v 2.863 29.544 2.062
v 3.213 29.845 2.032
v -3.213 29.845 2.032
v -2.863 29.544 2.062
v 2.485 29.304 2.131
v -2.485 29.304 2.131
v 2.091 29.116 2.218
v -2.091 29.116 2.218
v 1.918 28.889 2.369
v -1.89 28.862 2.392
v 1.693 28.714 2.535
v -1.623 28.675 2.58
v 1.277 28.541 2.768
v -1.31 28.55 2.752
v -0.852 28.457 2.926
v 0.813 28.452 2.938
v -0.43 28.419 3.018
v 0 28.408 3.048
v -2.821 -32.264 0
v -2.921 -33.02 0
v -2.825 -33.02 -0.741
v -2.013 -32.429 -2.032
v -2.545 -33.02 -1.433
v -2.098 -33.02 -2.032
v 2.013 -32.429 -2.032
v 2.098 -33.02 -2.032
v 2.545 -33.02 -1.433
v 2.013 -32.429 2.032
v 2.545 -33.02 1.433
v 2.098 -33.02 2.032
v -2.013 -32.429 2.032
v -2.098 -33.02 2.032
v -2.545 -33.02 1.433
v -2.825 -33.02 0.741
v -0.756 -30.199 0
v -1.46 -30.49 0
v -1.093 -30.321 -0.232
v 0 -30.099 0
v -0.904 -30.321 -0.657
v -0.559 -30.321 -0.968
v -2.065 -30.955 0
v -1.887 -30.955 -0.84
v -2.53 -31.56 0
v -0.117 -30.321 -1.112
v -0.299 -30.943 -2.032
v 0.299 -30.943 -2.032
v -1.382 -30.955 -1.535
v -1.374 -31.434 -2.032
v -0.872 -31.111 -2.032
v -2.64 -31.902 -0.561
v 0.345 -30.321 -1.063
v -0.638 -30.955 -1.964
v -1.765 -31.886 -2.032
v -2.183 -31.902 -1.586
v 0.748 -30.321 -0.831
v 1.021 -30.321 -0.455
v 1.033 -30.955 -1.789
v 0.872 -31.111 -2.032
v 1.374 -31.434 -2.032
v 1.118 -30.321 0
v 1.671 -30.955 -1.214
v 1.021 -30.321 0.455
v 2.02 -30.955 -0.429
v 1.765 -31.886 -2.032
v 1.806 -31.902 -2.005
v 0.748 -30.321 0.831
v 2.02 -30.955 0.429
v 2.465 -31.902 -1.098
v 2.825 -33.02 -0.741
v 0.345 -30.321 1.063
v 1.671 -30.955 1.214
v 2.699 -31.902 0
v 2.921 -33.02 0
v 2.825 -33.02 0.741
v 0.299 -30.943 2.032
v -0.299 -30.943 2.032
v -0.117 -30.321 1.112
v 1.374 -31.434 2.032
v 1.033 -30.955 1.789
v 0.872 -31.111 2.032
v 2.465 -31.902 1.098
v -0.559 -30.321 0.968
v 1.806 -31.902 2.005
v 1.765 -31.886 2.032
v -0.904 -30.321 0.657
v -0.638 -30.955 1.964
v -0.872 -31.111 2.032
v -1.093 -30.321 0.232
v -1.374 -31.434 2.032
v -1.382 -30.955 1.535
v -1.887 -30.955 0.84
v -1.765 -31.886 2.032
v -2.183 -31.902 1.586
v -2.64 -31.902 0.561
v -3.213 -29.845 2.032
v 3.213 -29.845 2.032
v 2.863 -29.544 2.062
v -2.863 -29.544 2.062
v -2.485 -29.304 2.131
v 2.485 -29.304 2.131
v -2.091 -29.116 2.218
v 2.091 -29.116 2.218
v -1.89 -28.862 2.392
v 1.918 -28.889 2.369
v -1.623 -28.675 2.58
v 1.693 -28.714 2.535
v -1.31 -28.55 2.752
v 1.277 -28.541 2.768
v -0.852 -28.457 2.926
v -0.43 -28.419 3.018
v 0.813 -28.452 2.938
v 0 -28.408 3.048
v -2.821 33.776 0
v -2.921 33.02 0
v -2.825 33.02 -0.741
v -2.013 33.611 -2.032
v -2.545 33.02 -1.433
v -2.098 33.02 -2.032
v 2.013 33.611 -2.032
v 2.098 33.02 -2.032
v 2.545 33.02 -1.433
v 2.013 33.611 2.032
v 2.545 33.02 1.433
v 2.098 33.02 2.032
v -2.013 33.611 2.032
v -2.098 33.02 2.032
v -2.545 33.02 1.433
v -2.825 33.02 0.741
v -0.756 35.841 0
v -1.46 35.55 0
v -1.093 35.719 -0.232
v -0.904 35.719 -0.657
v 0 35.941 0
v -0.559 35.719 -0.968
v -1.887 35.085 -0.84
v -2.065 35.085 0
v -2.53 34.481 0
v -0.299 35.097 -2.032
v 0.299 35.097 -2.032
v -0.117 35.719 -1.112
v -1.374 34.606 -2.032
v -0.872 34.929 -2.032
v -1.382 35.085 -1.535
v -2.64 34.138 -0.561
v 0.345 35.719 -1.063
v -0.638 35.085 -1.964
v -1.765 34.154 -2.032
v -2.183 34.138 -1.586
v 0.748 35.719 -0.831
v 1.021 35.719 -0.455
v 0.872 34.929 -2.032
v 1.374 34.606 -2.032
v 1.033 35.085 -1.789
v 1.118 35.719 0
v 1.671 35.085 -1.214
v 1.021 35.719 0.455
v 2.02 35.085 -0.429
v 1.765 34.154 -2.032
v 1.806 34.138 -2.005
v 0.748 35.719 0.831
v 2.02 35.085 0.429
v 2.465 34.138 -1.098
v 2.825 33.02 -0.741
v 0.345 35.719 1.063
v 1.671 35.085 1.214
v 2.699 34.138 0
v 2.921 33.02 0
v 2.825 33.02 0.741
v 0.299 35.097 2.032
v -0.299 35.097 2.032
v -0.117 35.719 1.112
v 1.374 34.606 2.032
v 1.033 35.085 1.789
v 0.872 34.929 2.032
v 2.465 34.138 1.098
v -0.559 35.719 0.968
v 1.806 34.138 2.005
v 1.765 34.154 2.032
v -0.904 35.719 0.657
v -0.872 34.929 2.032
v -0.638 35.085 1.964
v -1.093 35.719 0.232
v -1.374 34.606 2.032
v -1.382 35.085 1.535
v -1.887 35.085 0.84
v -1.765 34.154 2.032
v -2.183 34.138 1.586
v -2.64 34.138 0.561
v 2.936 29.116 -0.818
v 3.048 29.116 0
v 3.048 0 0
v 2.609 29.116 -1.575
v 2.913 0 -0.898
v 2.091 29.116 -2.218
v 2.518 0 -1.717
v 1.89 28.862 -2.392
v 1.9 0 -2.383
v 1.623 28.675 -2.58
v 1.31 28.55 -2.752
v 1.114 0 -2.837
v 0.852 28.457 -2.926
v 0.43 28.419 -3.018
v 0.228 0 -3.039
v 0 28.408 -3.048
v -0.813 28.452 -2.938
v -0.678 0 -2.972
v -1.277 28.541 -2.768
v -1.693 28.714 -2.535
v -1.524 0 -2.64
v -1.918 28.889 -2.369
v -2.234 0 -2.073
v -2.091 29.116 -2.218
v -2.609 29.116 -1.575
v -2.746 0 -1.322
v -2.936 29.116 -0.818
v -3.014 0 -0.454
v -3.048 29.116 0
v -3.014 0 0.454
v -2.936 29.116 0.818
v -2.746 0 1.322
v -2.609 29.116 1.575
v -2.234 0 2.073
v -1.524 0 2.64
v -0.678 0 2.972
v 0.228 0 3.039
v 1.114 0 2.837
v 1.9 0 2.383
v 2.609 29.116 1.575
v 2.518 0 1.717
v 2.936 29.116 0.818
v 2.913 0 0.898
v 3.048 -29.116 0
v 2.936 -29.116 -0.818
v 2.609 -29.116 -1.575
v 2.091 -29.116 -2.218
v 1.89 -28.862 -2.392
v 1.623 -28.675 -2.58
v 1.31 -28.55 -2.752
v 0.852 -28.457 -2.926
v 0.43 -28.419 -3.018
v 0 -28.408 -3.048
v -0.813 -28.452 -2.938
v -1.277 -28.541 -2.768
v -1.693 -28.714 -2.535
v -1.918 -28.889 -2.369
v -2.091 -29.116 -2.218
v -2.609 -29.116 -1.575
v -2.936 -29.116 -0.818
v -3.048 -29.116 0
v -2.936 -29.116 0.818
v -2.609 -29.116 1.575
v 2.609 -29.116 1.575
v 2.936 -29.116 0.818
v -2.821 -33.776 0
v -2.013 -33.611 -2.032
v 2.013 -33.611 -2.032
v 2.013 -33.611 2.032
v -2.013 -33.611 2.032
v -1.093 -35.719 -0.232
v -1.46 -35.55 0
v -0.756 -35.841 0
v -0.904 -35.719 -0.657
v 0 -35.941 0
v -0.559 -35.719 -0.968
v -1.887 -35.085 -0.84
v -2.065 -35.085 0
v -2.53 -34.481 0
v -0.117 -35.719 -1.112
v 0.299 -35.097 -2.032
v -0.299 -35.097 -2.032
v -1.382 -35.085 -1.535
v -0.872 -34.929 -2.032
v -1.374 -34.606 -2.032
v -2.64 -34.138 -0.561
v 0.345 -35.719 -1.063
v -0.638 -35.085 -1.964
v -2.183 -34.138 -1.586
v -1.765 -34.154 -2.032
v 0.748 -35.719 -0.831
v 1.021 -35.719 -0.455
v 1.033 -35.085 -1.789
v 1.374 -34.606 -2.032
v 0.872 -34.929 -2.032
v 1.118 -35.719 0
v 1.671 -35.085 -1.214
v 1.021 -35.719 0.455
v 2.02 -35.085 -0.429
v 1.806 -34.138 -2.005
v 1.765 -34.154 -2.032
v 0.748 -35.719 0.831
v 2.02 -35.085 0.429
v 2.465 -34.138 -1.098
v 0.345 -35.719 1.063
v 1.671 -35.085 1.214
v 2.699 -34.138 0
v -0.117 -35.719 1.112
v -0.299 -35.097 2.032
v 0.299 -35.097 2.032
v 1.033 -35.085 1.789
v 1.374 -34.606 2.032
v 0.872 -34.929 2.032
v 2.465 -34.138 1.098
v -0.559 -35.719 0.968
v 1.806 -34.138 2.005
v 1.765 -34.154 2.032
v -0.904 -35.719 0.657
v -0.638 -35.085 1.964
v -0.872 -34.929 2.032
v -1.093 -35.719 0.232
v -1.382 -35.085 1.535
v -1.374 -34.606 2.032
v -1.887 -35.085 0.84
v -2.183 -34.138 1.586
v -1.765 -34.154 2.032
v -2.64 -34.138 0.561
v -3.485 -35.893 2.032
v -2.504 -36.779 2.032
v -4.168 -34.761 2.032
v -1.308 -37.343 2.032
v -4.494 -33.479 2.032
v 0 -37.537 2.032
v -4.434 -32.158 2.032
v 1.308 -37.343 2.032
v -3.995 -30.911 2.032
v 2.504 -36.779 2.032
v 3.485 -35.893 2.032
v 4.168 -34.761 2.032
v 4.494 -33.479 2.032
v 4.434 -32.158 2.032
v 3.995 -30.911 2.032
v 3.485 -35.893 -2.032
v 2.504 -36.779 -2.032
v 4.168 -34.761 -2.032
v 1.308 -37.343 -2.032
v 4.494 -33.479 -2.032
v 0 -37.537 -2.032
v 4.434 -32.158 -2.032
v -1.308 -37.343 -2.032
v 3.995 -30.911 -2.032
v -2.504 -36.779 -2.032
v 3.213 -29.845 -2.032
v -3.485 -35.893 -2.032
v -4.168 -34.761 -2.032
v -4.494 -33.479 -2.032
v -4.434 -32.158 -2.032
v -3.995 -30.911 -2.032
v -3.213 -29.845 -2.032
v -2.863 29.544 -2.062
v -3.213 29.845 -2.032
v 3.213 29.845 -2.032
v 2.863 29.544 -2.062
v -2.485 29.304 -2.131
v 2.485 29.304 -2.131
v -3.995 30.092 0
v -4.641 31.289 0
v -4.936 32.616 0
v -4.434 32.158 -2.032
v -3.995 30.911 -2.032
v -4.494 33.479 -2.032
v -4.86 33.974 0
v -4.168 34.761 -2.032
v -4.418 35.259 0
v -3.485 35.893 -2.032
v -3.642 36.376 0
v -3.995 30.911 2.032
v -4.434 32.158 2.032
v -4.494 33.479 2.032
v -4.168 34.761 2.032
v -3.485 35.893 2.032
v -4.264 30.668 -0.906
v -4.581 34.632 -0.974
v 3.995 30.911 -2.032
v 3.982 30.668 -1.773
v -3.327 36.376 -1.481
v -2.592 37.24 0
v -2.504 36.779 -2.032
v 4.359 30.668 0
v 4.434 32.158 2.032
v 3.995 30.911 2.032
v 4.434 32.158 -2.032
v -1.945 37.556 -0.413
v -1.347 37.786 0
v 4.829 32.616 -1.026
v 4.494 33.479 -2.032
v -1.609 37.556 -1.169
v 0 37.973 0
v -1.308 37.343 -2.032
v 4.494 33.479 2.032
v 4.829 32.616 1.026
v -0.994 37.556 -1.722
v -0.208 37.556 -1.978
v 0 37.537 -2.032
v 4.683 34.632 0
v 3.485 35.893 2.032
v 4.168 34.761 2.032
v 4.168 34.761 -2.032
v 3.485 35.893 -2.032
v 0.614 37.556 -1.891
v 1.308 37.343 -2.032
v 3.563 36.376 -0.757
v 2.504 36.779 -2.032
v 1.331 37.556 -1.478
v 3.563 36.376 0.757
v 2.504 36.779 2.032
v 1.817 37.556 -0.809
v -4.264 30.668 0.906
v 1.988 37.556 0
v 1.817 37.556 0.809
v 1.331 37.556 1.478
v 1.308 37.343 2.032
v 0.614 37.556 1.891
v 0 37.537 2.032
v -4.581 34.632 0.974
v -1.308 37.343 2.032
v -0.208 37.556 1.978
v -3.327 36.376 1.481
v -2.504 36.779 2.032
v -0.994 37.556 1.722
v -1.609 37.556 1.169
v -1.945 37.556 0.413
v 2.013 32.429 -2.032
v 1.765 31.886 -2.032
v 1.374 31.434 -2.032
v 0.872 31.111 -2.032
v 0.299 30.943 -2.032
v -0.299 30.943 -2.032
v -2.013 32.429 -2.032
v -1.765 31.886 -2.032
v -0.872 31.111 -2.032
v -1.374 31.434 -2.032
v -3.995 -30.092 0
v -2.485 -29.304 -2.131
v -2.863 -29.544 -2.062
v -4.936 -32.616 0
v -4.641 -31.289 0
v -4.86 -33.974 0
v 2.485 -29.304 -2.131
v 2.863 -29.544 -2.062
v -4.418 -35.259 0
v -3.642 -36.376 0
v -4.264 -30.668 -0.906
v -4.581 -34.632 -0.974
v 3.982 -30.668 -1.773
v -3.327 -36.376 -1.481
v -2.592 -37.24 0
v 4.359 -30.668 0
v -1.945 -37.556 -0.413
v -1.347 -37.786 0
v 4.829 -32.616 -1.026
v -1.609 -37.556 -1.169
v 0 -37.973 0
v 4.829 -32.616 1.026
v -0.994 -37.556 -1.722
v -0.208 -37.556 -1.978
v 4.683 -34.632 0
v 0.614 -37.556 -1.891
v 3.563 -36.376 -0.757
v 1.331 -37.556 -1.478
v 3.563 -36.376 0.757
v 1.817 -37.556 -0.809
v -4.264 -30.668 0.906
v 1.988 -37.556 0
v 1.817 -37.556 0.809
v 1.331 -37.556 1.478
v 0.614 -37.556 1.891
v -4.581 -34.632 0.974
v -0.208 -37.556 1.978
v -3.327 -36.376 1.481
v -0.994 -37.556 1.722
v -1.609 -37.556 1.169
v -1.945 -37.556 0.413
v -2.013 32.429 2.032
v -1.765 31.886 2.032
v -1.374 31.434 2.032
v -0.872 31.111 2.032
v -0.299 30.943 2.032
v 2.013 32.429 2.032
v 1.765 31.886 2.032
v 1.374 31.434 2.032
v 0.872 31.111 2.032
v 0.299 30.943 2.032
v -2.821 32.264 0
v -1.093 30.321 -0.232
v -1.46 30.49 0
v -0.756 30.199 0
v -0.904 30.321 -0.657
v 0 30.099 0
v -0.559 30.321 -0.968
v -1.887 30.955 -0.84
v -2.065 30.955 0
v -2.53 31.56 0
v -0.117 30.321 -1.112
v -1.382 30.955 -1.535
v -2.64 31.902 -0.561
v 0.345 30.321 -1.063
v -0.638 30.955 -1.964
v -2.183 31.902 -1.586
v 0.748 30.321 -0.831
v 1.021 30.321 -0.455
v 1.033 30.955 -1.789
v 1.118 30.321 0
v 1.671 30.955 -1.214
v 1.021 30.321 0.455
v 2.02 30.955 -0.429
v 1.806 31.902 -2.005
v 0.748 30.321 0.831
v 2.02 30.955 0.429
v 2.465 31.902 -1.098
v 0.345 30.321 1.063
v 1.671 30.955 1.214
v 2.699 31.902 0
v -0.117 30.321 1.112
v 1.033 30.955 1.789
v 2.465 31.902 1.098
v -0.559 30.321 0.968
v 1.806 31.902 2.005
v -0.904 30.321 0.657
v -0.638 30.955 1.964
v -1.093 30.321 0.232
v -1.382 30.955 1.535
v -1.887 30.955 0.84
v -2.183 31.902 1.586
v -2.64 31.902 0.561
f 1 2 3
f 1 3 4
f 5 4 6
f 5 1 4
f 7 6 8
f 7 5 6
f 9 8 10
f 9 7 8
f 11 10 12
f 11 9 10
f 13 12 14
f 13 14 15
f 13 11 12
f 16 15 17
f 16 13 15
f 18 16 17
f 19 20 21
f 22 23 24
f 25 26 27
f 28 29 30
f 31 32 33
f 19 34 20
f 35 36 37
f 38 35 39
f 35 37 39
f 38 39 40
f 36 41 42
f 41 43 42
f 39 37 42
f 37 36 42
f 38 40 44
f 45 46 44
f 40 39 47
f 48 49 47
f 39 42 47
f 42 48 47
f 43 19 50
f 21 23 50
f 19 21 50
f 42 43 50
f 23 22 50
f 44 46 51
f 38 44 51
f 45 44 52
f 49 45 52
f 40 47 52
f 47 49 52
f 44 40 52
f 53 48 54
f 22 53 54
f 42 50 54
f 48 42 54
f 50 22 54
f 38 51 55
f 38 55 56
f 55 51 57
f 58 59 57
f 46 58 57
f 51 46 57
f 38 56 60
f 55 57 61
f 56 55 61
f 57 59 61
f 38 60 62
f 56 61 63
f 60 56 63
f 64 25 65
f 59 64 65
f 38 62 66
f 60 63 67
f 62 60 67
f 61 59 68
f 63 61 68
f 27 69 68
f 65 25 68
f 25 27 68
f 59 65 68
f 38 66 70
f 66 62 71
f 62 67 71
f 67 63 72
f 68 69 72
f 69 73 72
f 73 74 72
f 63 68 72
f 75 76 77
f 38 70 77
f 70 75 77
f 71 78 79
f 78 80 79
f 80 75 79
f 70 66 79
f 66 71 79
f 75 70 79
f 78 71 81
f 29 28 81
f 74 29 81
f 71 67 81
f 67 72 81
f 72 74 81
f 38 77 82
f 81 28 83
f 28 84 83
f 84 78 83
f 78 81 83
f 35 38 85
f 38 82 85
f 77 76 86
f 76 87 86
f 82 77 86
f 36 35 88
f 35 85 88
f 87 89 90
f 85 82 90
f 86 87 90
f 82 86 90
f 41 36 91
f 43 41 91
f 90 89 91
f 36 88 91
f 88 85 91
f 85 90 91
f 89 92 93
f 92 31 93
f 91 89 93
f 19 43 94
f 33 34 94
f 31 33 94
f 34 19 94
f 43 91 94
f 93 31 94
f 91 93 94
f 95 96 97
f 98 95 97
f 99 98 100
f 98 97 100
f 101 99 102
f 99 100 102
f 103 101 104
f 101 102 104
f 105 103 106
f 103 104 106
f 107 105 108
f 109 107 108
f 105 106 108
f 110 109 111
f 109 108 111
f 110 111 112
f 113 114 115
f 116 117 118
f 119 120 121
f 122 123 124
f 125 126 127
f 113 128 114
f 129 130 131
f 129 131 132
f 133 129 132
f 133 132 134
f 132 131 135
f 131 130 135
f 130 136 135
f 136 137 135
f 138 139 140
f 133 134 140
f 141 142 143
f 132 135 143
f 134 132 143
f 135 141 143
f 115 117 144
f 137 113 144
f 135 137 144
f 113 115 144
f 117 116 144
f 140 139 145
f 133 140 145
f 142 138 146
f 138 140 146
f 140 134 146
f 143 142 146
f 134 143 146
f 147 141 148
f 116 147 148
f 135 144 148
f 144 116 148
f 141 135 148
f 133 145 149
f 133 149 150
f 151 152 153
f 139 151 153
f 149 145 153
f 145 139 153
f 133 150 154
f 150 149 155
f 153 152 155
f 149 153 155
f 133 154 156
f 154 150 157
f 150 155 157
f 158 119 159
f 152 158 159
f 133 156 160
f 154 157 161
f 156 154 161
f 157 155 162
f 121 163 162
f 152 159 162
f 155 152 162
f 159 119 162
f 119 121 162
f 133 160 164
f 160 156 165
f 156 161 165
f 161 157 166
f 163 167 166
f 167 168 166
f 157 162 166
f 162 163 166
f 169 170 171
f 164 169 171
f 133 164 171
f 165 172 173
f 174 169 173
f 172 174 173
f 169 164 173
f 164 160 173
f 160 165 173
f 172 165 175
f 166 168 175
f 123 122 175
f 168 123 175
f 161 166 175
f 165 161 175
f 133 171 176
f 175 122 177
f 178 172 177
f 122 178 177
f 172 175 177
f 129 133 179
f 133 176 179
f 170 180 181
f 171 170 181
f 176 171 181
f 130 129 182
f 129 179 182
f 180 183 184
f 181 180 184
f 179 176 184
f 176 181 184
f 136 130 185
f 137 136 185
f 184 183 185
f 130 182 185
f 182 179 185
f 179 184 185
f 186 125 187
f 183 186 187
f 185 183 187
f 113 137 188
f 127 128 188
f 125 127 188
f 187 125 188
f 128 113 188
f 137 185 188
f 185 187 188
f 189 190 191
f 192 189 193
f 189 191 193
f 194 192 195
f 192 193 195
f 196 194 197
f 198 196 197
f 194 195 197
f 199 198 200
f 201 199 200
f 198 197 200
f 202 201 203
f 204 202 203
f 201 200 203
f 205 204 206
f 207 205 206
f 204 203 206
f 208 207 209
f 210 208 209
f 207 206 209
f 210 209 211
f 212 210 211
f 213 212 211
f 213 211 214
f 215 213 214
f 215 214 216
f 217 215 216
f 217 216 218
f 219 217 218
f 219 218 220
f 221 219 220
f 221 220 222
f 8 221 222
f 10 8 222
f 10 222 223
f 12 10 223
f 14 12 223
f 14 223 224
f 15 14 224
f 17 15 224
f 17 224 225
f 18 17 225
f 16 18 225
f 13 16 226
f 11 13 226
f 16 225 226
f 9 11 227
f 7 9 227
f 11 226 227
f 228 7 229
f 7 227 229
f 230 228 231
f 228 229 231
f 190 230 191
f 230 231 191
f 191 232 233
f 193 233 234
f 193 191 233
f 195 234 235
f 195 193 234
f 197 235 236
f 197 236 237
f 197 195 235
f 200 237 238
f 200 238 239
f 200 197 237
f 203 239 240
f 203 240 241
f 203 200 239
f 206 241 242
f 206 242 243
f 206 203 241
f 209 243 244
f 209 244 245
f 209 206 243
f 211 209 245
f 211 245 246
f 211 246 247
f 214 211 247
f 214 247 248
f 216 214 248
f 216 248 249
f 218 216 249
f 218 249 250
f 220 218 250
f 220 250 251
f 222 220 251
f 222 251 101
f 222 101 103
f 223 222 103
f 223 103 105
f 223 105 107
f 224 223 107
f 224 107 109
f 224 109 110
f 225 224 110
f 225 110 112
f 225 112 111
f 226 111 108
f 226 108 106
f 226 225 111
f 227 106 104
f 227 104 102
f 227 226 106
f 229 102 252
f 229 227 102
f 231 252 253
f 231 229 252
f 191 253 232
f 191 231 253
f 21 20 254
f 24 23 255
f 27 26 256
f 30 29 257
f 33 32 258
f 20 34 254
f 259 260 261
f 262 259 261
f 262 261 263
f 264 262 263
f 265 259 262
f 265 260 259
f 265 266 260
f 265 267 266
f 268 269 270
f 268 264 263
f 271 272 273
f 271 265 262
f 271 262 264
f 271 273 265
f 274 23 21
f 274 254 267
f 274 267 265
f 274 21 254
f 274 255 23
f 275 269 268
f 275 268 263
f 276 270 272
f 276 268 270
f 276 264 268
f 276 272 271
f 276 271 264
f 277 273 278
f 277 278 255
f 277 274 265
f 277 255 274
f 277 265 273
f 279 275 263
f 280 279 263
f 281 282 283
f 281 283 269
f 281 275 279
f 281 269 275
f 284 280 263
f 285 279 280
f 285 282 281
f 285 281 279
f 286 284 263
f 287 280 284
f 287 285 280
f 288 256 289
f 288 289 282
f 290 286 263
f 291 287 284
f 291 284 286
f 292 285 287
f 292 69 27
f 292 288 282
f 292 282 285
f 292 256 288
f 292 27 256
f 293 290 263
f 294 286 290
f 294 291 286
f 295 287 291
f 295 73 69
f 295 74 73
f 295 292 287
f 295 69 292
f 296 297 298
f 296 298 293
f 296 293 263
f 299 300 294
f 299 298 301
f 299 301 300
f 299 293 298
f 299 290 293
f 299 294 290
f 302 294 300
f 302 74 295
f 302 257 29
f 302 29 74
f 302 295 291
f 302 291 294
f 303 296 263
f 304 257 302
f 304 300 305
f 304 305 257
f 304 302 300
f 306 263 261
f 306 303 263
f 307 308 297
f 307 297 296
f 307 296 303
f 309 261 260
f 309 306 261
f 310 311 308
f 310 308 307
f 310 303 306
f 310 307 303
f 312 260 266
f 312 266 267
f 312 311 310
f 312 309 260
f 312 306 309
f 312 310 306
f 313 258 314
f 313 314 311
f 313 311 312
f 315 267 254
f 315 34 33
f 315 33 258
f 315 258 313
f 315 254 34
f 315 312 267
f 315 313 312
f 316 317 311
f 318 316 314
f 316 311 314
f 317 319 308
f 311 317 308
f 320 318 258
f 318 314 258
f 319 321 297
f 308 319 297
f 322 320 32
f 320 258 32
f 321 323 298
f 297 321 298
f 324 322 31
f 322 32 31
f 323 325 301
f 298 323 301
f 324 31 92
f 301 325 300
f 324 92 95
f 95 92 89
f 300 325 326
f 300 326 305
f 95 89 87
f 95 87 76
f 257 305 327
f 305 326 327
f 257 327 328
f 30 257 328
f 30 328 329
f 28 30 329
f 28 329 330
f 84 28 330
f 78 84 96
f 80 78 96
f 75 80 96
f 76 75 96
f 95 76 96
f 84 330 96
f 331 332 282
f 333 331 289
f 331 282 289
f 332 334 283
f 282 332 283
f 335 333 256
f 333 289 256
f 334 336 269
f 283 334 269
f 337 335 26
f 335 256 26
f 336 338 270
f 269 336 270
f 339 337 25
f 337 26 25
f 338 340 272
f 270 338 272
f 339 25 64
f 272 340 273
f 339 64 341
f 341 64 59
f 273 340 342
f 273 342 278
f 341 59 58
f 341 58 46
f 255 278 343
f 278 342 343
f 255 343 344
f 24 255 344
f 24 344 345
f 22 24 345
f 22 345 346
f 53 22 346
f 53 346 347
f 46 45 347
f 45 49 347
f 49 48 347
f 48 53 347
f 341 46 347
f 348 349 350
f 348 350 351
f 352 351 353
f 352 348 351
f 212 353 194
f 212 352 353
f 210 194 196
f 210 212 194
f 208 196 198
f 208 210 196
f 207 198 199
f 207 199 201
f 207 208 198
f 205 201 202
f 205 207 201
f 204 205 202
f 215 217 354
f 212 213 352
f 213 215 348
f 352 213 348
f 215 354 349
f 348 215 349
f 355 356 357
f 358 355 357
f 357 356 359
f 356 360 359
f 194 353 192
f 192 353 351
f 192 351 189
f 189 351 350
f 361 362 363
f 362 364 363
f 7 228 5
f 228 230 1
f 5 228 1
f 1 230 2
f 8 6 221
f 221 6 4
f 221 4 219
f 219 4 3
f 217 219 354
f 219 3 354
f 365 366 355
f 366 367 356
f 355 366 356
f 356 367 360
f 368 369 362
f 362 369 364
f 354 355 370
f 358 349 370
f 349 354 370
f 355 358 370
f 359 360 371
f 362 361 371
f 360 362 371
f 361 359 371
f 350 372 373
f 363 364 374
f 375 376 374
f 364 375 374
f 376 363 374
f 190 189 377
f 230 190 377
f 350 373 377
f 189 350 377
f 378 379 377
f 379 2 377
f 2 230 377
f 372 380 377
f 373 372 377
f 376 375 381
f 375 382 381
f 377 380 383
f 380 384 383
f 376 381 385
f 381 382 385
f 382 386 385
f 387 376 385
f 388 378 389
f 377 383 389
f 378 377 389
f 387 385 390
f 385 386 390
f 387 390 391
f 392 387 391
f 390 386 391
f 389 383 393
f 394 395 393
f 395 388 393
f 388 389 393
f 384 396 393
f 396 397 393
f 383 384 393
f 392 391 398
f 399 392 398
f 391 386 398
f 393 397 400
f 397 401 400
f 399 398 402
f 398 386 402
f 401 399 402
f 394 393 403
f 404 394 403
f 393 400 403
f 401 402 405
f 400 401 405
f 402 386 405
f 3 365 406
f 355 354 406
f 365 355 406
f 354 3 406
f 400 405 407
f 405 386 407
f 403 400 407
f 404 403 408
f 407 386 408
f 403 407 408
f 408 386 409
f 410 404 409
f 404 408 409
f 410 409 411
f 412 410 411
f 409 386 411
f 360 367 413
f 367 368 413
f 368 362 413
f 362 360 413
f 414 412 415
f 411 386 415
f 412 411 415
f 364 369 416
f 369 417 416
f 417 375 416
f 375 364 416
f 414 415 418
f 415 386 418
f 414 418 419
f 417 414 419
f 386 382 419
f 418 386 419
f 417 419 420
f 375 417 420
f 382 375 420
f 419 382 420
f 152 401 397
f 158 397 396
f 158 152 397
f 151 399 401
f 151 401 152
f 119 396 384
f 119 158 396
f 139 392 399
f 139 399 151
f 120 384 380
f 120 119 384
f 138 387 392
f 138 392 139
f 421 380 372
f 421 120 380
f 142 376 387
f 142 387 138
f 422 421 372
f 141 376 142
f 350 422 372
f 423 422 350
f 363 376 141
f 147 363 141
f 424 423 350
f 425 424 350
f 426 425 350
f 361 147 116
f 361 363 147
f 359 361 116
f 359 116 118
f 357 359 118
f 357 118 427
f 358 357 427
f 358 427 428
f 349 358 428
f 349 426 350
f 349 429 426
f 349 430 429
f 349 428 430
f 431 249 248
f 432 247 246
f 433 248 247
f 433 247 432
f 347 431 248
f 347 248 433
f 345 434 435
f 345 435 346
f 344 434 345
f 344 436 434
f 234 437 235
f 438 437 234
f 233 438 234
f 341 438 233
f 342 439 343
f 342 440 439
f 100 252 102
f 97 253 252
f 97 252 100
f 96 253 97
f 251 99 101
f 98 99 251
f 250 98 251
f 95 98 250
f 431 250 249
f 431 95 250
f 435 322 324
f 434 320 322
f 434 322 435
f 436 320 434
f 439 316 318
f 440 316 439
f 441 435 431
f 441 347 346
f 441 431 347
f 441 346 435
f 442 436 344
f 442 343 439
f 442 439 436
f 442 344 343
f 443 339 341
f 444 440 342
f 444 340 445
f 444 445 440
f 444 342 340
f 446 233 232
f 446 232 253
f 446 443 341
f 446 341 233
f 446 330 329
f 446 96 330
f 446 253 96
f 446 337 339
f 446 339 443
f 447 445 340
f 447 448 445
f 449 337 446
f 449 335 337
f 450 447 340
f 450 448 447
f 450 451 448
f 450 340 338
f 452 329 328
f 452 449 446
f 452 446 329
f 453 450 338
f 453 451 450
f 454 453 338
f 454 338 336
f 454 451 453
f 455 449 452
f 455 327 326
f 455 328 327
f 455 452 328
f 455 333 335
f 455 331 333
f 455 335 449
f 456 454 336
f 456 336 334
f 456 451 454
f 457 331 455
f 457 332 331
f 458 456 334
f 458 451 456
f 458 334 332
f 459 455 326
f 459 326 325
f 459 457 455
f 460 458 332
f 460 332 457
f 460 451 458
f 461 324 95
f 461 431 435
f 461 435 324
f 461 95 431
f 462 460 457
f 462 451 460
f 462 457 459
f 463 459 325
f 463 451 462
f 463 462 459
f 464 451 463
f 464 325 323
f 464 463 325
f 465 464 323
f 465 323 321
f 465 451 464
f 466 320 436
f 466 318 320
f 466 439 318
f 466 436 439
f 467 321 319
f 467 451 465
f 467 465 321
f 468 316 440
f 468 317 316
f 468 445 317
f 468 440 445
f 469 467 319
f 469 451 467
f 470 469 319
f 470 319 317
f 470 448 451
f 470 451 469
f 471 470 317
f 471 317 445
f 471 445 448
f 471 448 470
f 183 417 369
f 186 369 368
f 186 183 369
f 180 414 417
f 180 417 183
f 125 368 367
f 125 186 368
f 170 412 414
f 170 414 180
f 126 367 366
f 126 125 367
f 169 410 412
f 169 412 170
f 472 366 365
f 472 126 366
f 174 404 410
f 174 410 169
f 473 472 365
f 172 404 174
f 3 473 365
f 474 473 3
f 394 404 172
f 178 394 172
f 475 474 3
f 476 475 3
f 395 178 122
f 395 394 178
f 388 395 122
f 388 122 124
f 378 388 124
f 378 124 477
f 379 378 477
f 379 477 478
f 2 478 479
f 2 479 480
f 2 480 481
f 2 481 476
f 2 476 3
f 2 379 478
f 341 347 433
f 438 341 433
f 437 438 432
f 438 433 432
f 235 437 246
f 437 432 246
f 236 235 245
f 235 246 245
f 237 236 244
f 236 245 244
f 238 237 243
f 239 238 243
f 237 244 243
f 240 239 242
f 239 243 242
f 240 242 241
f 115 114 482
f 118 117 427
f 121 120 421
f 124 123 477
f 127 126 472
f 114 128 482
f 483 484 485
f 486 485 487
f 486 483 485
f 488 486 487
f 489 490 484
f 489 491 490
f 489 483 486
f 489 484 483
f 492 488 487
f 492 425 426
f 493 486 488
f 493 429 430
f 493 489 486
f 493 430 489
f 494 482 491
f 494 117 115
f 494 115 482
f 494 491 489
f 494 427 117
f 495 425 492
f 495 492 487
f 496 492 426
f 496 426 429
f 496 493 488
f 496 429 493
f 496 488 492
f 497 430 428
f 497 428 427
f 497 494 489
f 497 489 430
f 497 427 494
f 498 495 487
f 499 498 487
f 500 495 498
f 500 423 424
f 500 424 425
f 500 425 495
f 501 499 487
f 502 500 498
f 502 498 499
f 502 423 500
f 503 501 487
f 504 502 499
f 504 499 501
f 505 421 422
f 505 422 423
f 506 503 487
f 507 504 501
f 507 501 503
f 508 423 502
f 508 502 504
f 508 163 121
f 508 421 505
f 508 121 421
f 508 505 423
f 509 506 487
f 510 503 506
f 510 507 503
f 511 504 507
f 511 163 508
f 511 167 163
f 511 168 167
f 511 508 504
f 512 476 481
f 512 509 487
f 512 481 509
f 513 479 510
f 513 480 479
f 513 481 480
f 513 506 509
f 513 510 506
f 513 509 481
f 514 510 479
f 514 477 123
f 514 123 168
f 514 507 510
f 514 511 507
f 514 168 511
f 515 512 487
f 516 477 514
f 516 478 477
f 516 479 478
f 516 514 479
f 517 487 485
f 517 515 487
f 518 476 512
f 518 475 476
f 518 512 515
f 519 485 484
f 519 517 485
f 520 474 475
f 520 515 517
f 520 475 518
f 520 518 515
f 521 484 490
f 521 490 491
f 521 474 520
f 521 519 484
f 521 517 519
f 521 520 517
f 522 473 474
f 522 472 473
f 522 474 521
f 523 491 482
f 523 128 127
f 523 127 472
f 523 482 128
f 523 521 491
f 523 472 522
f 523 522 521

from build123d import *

# Parameters (mm, degrees)
SKETCH1_R               = 3.048
BOSS_EXTRUDE1_DEPTH     = 33.02
CUT_EXTRUDE1_DEPTH      = 5.953
CUT_EXTRUDE1_DEPTH_BACK = 5.953


with BuildPart() as part:
    # Sketch1 → Boss-Extrude1 (new body)
    with BuildSketch(Plane(origin=(0, 0, 0), x_dir=(1, 0, 0), z_dir=(0, 1, 0))):
        Circle(SKETCH1_R)
    extrude(amount=BOSS_EXTRUDE1_DEPTH)

    # Sketch2 → Revolve3 (revolve)
    with BuildSketch(Plane.XY):
        with BuildLine():
            Line((0, 37.973), (0, 35.941))
            ThreePointArc((0, 35.941), (-2.921, 33.02), (0, 30.099))
            Line((0, 30.099), (0, 28.067))
            ThreePointArc((0, 28.067), (-4.953, 33.02), (0, 37.973))
        make_face()
    revolve(axis=Axis((0, 37.973, 0), (0, -1, 0)))

    # Sketch3 → Cut-Extrude1 (cut, two sides)
    with BuildSketch(Plane(origin=(0, 0, 0), x_dir=(0, 0, -1), z_dir=(1, 0, 0))) as cut_extrude1_sk:
        with BuildLine():
            Line((-2.032, 37.973), (-2.032, 29.845))
            ThreePointArc((-2.032, 29.845), (-2.478369265, 28.767369265), (-3.556, 28.321))
            Line((-3.556, 28.321), (-6.35, 28.321))
            Line((-6.35, 28.321), (-6.35, 37.973))
            Line((-6.35, 37.973), (-2.032, 37.973))
        make_face()
        with BuildLine():
            Line((6.35, 37.973), (2.032, 37.973))
            Line((2.032, 37.973), (2.032, 29.845))
            ThreePointArc((2.032, 29.845), (2.478369265, 28.767369265), (3.556, 28.321))
            Line((3.556, 28.321), (6.35, 28.321))
            Line((6.35, 28.321), (6.35, 37.973))
        make_face()
    extrude(amount=CUT_EXTRUDE1_DEPTH, mode=Mode.SUBTRACT)
    extrude(cut_extrude1_sk.sketch, amount=-CUT_EXTRUDE1_DEPTH_BACK, mode=Mode.SUBTRACT)

    # Sketch4 → Cut-Revolve1 (revolve, cut)
    with BuildSketch(Plane.XY):
        with BuildLine():
            Line((0, 35.941), (0, 30.099))
            ThreePointArc((0, 30.099), (-2.921, 33.02), (0, 35.941))
        make_face()
    revolve(axis=Axis((0, 35.941, 0), (0, -1, 0)), mode=Mode.SUBTRACT)

    # Mirror1: part across plane


with BuildPart() as part_1:
    add(part.part)
    add(part.part.mirror(Plane.ZX))


solid = part_1.part
